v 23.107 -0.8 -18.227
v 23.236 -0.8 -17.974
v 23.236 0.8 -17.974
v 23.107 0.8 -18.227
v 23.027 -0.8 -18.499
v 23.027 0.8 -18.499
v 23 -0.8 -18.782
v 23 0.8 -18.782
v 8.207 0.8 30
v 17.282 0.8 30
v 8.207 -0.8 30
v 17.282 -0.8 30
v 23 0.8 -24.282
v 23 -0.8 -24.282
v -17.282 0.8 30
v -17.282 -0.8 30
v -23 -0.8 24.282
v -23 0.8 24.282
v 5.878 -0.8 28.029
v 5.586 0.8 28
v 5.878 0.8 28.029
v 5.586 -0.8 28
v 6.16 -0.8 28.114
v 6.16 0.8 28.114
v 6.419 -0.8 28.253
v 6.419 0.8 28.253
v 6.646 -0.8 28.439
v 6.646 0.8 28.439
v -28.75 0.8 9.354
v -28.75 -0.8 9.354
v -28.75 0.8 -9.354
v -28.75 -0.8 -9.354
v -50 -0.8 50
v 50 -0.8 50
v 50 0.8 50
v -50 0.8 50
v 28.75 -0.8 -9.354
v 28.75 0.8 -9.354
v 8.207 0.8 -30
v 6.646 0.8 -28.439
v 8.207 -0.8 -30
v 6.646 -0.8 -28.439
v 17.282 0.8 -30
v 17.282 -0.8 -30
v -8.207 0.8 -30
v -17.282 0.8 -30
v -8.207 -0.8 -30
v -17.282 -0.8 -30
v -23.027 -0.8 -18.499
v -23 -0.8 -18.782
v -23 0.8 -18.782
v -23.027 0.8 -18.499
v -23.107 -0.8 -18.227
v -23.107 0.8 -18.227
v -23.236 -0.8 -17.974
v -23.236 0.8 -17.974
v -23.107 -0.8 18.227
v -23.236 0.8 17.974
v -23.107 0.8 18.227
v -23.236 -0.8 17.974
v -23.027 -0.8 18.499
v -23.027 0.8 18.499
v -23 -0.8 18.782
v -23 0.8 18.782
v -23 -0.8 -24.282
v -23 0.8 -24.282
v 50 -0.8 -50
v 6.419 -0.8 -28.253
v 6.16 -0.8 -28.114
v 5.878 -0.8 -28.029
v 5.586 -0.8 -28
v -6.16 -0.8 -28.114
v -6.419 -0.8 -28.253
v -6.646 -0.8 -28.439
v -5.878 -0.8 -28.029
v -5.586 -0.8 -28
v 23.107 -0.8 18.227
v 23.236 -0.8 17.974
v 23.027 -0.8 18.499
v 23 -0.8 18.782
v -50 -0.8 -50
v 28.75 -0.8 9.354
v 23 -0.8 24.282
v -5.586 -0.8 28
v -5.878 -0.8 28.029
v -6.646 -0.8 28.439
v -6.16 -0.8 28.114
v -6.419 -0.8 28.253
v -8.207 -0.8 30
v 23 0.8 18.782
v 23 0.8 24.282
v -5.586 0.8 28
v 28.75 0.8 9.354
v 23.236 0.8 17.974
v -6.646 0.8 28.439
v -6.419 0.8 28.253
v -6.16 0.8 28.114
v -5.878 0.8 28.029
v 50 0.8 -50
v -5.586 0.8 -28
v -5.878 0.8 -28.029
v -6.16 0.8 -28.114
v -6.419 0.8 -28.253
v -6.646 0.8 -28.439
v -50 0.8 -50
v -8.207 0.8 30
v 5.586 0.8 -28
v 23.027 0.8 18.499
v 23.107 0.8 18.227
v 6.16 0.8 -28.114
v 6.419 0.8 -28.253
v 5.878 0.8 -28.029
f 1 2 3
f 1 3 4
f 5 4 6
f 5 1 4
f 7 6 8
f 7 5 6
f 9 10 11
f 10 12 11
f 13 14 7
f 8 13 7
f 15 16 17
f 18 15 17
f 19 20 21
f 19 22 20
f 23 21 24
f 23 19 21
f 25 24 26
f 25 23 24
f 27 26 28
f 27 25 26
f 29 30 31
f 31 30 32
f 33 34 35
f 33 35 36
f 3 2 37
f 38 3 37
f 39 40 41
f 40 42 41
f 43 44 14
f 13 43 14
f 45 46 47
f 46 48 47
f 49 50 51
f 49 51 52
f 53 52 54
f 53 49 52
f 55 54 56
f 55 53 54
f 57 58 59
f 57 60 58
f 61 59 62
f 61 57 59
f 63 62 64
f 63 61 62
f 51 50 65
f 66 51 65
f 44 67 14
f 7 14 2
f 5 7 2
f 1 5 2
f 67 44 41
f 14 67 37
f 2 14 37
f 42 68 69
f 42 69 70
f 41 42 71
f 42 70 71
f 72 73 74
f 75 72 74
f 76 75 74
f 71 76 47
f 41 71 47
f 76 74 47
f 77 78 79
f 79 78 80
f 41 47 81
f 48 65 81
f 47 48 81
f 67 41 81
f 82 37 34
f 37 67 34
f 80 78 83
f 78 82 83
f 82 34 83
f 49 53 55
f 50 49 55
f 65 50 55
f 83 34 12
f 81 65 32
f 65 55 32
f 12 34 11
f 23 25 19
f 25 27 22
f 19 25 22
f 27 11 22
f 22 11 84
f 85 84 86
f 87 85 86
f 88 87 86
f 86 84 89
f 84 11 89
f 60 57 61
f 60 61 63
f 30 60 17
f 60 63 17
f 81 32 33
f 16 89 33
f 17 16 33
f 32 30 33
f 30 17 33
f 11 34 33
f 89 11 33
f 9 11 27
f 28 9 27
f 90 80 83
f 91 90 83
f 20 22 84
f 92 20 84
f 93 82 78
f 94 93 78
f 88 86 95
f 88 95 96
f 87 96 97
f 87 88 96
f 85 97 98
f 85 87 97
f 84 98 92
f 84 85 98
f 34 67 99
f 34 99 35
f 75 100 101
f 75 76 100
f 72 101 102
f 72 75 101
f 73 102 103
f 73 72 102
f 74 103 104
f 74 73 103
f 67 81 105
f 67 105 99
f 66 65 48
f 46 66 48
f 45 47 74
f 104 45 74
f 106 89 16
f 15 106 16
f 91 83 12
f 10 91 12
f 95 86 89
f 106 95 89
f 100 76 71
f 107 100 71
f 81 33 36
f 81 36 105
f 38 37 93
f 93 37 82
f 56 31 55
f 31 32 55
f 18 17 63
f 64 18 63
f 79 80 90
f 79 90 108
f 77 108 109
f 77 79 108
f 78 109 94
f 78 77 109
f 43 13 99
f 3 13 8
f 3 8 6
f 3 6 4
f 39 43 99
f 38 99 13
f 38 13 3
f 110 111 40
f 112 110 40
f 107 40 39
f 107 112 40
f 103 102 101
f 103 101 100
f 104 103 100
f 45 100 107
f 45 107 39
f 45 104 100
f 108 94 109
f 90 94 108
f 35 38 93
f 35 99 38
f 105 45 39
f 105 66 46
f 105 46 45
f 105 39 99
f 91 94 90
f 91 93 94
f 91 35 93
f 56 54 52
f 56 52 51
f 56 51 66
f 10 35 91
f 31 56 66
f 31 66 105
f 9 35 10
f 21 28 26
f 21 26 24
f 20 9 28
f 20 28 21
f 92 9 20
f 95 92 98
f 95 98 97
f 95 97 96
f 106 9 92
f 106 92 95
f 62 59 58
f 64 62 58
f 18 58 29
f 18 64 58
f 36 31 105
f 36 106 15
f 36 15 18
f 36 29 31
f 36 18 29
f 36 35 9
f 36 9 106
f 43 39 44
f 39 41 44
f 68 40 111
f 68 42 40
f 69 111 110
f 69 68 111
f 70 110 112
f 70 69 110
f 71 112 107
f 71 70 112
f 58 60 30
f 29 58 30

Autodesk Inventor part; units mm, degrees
ref_plane "YZ Plane" through (0, 0, 0) normal (1, 0, 0) x (0, 1, 0)
ref_plane "XZ Plane" through (0, 0, 0) normal (0, 1, 0) x (-1, 0, 0)
ref_plane "XY Plane" through (0, 0, 0) normal (0, 0, 1) x (1, 0, 0)
sketch "Sketch1" plane through (0, 0, 0) normal (0, 1, 0) x (-1, 0, 0)
  line L0 (0, 0) -> (0, 28.5) construction
  line L1 (0, 28.5) -> (5.5858, 28.5) construction
  line L2 (6.2929, 28.7929) -> (7.7071, 30.2071) construction
  line L3 (8.4142, 30.5) -> (17.0754, 30.5) construction
  line L4 (17.7825, 30.2071) -> (23.2071, 24.7825) construction
  line L5 (23.5, 24.0754) -> (23.5, 18.7821) construction
  line L6 (23.6576, 18.2432) -> (29.0924, 9.7464) construction
  line L7 (29.25, 9.2075) -> (29.25, 0) construction
  line L8 (29.25, 0) -> (0, 0) construction
  arc A0 (29.25, 9.2075) -> (29.0924, 9.7464) centre (28.25, 9.2075) ccw construction
  arc A1 (23.5, 18.7821) -> (23.6576, 18.2432) centre (24.5, 18.7821) ccw construction
  arc A2 (23.5, 24.0754) -> (23.2071, 24.7825) centre (22.5, 24.0754) ccw construction
  arc A3 (17.7825, 30.2071) -> (17.0754, 30.5) centre (17.0754, 29.5) ccw construction
  arc A4 (8.4142, 30.5) -> (7.7071, 30.2071) centre (8.4142, 29.5) ccw construction
  arc A5 (5.5858, 28.5) -> (6.2929, 28.7929) centre (5.5858, 29.5) ccw construction
  line L9 (0, 28.5) -> (-5.5858, 28.5) construction
  line L10 (-6.2929, 28.7929) -> (-7.7071, 30.2071) construction
  line L11 (-8.4142, 30.5) -> (-17.0754, 30.5) construction
  line L12 (-17.7825, 30.2071) -> (-23.2071, 24.7825) construction
  line L13 (-23.5, 24.0754) -> (-23.5, 18.7821) construction
  line L14 (-23.6576, 18.2432) -> (-29.0924, 9.7464) construction
  line L15 (-29.25, 9.2075) -> (-29.25, 0) construction
  arc A6 (-29.0924, 9.7464) -> (-29.25, 9.2075) centre (-28.25, 9.2075) ccw construction
  arc A7 (-23.6576, 18.2432) -> (-23.5, 18.7821) centre (-24.5, 18.7821) ccw construction
  arc A8 (-23.2071, 24.7825) -> (-23.5, 24.0754) centre (-22.5, 24.0754) ccw construction
  arc A9 (-17.0754, 30.5) -> (-17.7825, 30.2071) centre (-17.0754, 29.5) ccw construction
  arc A10 (-7.7071, 30.2071) -> (-8.4142, 30.5) centre (-8.4142, 29.5) ccw construction
  arc A11 (-6.2929, 28.7929) -> (-5.5858, 28.5) centre (-5.5858, 29.5) ccw construction
  line L16 (0, -28.5) -> (5.5858, -28.5) construction
  line L17 (6.2929, -28.7929) -> (7.7071, -30.2071) construction
  line L18 (8.4142, -30.5) -> (17.0754, -30.5) construction
  line L19 (17.7825, -30.2071) -> (23.2071, -24.7825) construction
  line L20 (23.5, -24.0754) -> (23.5, -18.7821) construction
  line L21 (23.6576, -18.2432) -> (29.0924, -9.7464) construction
  line L22 (29.25, -9.2075) -> (29.25, 0) construction
  arc A12 (29.0924, -9.7464) -> (29.25, -9.2075) centre (28.25, -9.2075) ccw construction
  arc A13 (23.6576, -18.2432) -> (23.5, -18.7821) centre (24.5, -18.7821) ccw construction
  arc A14 (23.2071, -24.7825) -> (23.5, -24.0754) centre (22.5, -24.0754) ccw construction
  arc A15 (17.0754, -30.5) -> (17.7825, -30.2071) centre (17.0754, -29.5) ccw construction
  arc A16 (7.7071, -30.2071) -> (8.4142, -30.5) centre (8.4142, -29.5) ccw construction
  arc A17 (6.2929, -28.7929) -> (5.5858, -28.5) centre (5.5858, -29.5) ccw construction
  arc A18 (-23.5, -18.7821) -> (-23.6576, -18.2432) centre (-24.5, -18.7821) ccw construction
  line L23 (-23.6576, -18.2432) -> (-29.0924, -9.7464) construction
  arc A19 (-29.25, -9.2075) -> (-29.0924, -9.7464) centre (-28.25, -9.2075) ccw construction
  line L24 (-29.25, -9.2075) -> (-29.25, 0) construction
  line L25 (0, -28.5) -> (-5.5858, -28.5) construction
  line L26 (-6.2929, -28.7929) -> (-7.7071, -30.2071) construction
  line L27 (-8.4142, -30.5) -> (-17.0754, -30.5) construction
  line L28 (-23.5, -24.0754) -> (-23.5, -18.7821) construction
  arc A20 (-23.5, -24.0754) -> (-23.2071, -24.7825) centre (-22.5, -24.0754) ccw construction
  line L29 (-17.7825, -30.2071) -> (-23.2071, -24.7825) construction
  arc A21 (-17.7825, -30.2071) -> (-17.0754, -30.5) centre (-17.0754, -29.5) ccw construction
  arc A22 (-5.5858, -28.5) -> (-6.2929, -28.7929) centre (-5.5858, -29.5) ccw construction
  arc A23 (-8.4142, -30.5) -> (-7.7071, -30.2071) centre (-8.4142, -29.5) ccw construction
  line L30 (5.5858, -28) -> (0, -28)
  line L31 (0, -28) -> (-5.5858, -28)
  arc A24 (-5.5858, -28) -> (-6.6464, -28.4393) centre (-5.5858, -29.5) ccw
  line L32 (-6.6464, -28.4393) -> (-8.2071, -30)
  line L33 (-8.2071, -30) -> (-17.2825, -30)
  line L34 (-17.2825, -30) -> (-23, -24.2825)
  line L35 (-23, -24.2825) -> (-23, -18.7821)
  arc A25 (-23, -18.7821) -> (-23.2364, -17.9738) centre (-24.5, -18.7821) ccw
  line L36 (-23.2364, -17.9738) -> (-28.75, -9.3538)
  line L37 (-28.75, -9.3538) -> (-28.75, 0)
  line L38 (-28.75, 0) -> (-28.75, 9.3538)
  line L39 (-28.75, 9.3538) -> (-23.2364, 17.9738)
  arc A26 (-23.2364, 17.9738) -> (-23, 18.7821) centre (-24.5, 18.7821) ccw
  line L40 (-23, 18.7821) -> (-23, 24.2825)
  line L41 (-23, 24.2825) -> (-17.2825, 30)
  line L42 (-17.2825, 30) -> (-8.2071, 30)
  line L43 (-8.2071, 30) -> (-6.6464, 28.4393)
  arc A27 (-6.6464, 28.4393) -> (-5.5858, 28) centre (-5.5858, 29.5) ccw
  line L44 (-5.5858, 28) -> (0, 28)
  line L45 (0, 28) -> (5.5858, 28)
  arc A28 (5.5858, 28) -> (6.6464, 28.4393) centre (5.5858, 29.5) ccw
  line L46 (6.6464, 28.4393) -> (8.2071, 30)
  line L47 (8.2071, 30) -> (17.2825, 30)
  line L48 (17.2825, 30) -> (23, 24.2825)
  line L49 (23, 24.2825) -> (23, 18.7821)
  arc A29 (23, 18.7821) -> (23.2364, 17.9738) centre (24.5, 18.7821) ccw
  line L50 (23.2364, 17.9738) -> (28.75, 9.3538)
  line L51 (28.75, 9.3538) -> (28.75, 0)
  line L52 (28.75, 0) -> (28.75, -9.3538)
  line L53 (28.75, -9.3538) -> (23.2364, -17.9738)
  arc A30 (23.2364, -17.9738) -> (23, -18.7821) centre (24.5, -18.7821) ccw
  line L54 (23, -18.7821) -> (23, -24.2825)
  line L55 (23, -24.2825) -> (17.2825, -30)
  line L56 (17.2825, -30) -> (8.2071, -30)
  line L57 (8.2071, -30) -> (6.6464, -28.4393)
  arc A31 (6.6464, -28.4393) -> (5.5858, -28) centre (5.5858, -29.5) ccw
  line L58 (-50, 50) -> (50, 50)
  line L59 (50, 50) -> (50, -50)
  line L60 (50, -50) -> (-50, -50)
  line L61 (-50, -50) -> (-50, 50)
  line L62 (50, 0) -> (-50, 0) construction
  point P0 (6, 28.5)
  point P1 (17.4896, 30.5)
  point P2 (23.5, 24.4896)
  point P3 (23.5, 18.4896)
  point P4 (29.25, 9.5)
  point P5 (-6, 28.5)
  point P6 (-17.4896, 30.5)
  point P7 (-23.5, 24.4896)
  point P8 (-23.5, 18.4896)
  point P9 (-29.25, 9.5)
  point P10 (6, -28.5)
  point P11 (17.4896, -30.5)
  point P12 (23.5, -24.4896)
  point P13 (23.5, -18.4896)
  point P14 (29.25, -9.5)
  point P15 (-23.5, -18.4896)
  point P16 (-29.25, -9.5)
  point P17 (-6, -28.5)
  point P18 (-17.4896, -30.5)
  point P19 (-23.5, -24.4896)
  dimension "d0" = 45
  dimension "d1" = 6
  dimension "d2" = 30.5
  dimension "d3" = 28.5
  dimension "d4" = 29.25
  dimension "d5" = 6
  dimension "d6" = 9.5
  dimension "d7" = 23.5
  dimension "d8" = 8.5
  dimension "d9" = 1
  dimension "d10" = 0.5
  dimension "d11" = 100
extrude "Extrusion1" add sketch "Sketch1" along normal mid plane 1.6
equation "\"d10\" = offset"
equation "\"offset\" = 0.5"
properties part number "tarot_PCB_center"
